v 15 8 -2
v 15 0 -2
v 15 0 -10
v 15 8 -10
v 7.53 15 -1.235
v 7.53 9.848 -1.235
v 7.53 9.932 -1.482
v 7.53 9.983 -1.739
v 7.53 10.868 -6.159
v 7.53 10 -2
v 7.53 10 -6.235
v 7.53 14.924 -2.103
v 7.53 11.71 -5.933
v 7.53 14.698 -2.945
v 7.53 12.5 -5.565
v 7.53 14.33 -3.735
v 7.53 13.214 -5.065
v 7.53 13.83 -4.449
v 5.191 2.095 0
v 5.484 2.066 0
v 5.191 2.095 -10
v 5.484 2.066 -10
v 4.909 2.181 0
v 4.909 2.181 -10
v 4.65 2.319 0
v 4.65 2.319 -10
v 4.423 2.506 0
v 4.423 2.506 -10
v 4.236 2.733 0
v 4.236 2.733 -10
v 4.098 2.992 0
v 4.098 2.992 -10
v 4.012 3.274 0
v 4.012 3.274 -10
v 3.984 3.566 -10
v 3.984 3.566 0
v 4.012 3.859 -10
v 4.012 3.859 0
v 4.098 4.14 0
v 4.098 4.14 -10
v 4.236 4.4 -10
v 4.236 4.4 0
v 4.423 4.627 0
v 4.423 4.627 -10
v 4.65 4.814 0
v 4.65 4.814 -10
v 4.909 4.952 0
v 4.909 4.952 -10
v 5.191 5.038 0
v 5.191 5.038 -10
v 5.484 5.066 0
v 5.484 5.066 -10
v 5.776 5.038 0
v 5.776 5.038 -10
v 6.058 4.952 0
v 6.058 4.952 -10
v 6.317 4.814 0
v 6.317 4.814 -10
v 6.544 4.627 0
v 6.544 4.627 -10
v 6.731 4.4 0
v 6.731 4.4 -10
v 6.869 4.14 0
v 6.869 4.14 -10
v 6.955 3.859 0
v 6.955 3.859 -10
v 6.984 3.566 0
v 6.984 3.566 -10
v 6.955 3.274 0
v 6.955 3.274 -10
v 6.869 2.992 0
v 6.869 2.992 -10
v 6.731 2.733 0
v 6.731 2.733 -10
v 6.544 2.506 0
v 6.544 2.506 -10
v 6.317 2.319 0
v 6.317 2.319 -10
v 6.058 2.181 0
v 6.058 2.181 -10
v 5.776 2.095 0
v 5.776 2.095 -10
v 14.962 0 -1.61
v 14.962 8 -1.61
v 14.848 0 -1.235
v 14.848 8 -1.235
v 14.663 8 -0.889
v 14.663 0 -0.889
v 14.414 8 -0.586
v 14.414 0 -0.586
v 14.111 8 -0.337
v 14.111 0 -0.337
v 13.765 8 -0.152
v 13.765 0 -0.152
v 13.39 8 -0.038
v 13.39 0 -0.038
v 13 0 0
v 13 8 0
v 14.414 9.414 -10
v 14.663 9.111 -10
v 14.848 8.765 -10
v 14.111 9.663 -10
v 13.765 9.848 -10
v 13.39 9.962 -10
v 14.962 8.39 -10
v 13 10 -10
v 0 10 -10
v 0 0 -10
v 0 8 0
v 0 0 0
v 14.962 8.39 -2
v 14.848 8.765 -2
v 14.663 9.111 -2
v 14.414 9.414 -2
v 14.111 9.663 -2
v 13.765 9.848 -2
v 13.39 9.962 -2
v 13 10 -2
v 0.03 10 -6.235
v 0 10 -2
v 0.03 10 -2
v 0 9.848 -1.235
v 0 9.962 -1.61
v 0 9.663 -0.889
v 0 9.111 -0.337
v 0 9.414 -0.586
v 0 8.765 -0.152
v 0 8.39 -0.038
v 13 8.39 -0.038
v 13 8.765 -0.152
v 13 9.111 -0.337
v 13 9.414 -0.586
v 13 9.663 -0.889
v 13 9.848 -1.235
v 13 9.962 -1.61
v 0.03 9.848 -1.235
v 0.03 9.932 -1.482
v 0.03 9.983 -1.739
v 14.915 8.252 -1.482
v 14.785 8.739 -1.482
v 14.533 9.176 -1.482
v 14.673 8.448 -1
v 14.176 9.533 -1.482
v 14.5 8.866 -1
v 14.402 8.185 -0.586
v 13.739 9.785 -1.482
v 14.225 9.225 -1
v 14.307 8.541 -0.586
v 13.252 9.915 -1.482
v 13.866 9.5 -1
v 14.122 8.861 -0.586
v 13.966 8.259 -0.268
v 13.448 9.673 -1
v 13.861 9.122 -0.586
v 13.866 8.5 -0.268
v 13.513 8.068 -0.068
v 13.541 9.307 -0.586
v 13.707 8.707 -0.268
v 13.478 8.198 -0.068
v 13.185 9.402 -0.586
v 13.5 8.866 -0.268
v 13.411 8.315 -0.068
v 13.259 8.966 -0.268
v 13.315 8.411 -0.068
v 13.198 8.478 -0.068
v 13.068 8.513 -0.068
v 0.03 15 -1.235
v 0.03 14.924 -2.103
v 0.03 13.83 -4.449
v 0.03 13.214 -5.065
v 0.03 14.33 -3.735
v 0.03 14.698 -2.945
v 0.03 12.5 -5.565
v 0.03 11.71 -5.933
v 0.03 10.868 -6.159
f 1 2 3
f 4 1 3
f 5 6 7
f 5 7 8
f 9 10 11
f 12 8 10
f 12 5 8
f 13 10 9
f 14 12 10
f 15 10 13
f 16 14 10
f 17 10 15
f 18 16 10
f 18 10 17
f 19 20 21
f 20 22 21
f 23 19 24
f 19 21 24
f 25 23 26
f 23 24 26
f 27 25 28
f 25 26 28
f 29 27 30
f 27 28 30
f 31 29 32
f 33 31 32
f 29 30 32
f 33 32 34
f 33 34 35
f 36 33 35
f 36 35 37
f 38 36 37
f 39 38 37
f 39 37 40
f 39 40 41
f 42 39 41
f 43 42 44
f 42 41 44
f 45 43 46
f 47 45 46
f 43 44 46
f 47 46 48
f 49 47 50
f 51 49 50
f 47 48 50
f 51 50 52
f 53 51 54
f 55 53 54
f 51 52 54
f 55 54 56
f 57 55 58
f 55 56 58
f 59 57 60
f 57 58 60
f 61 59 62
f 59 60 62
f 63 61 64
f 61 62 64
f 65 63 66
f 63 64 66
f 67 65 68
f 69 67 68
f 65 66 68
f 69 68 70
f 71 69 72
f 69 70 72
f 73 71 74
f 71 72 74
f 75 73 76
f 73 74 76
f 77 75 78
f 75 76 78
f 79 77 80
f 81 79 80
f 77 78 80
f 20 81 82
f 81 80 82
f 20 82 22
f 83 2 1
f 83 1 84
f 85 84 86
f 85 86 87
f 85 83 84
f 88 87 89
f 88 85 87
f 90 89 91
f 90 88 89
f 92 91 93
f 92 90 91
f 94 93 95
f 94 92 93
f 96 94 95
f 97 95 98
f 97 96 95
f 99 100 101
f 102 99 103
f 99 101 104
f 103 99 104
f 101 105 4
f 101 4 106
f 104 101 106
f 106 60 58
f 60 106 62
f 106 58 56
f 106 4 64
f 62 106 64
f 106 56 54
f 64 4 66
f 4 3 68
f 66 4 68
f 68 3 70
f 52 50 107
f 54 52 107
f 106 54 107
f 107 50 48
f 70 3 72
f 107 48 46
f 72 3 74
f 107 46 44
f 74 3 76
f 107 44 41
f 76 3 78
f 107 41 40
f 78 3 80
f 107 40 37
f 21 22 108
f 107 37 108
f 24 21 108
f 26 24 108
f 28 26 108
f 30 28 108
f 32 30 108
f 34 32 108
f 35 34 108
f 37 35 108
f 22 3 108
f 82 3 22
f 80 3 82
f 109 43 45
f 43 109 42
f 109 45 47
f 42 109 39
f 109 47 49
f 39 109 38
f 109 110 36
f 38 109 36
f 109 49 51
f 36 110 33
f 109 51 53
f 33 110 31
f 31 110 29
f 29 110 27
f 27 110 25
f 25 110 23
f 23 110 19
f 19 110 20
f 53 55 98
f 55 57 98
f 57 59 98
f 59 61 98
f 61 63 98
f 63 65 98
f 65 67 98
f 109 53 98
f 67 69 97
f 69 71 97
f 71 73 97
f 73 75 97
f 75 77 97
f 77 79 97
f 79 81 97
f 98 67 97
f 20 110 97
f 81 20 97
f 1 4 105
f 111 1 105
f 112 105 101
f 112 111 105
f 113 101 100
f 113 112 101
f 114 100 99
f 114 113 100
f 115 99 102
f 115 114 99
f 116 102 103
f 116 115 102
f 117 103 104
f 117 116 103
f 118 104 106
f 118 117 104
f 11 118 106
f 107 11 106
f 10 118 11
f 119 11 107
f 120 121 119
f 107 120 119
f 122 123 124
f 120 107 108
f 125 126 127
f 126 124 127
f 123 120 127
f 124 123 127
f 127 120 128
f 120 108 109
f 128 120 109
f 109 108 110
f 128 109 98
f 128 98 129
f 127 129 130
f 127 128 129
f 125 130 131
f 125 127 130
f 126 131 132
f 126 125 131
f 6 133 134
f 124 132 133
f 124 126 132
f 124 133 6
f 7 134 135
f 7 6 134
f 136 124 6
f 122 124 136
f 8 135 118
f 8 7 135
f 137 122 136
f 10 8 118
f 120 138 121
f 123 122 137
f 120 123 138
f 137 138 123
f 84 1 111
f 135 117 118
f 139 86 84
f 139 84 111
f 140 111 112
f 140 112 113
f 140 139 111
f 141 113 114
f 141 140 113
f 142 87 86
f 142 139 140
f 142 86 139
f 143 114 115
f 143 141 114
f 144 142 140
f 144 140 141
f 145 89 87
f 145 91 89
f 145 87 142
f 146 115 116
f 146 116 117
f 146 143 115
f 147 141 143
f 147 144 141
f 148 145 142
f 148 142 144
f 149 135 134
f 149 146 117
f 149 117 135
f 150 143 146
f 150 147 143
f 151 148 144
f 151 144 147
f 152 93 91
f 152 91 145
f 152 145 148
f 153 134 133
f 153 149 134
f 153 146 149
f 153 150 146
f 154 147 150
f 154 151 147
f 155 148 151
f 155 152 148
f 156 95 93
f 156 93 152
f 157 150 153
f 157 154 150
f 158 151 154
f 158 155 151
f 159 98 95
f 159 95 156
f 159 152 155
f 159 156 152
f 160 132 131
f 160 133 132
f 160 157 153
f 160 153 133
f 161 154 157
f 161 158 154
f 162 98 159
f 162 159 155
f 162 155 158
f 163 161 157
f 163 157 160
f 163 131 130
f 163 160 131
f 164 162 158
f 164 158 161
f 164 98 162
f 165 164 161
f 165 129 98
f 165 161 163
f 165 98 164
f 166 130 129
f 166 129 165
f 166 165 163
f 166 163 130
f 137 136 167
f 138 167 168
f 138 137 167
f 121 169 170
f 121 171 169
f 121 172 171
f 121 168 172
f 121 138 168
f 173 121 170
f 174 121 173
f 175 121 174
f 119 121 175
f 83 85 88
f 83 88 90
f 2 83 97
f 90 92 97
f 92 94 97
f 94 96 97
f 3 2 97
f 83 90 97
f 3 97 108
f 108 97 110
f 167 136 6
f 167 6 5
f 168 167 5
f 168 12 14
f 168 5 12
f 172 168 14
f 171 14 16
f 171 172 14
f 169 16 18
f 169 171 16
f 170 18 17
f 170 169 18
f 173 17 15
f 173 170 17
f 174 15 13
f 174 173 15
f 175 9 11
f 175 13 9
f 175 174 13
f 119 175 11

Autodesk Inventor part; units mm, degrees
ref_plane "YZ Plane" through (0, 0, 0) normal (1, 0, 0) x (0, 1, 0)
ref_plane "XZ Plane" through (0, 0, 0) normal (0, 1, 0) x (-1, 0, 0)
ref_plane "XY Plane" through (0, 0, 0) normal (0, 0, 1) x (1, 0, 0)
sketch "Sketch1" plane through (0, 0, 0) normal (0, 1, 0) x (-1, 0, 0)
  line L0 (0, 0) -> (-15, 0)
  line L1 (-15, 0) -> (-15, -10)
  line L2 (-15, -10) -> (0, -10)
  line L3 (0, -10) -> (0, 0)
  dimension "d0" = 10
  dimension "d1" = 15
extrude "Extrusion1" add sketch "Sketch1" along normal blind 10
sketch "Sketch2" plane through (0, 10, 0) normal (0, 1, 0) x (1, 0, 0)
  line L0 (0.0305, 1.2348) -> (7.5305, 1.2348)
  line L1 (7.5305, 1.2348) -> (7.5305, 6.2348)
  line L2 (7.5305, 6.2348) -> (0.0305, 6.2348)
  line L3 (0.0305, 6.2348) -> (0.0305, 1.2348)
  point P0 (0, 0)
  dimension "d4" = 5
  dimension "d5" = 7.5
revolve "Revolution1" add sketch "Sketch2" angle 90 about axis through (0.0305, 10, -1.2348) along (1, 0, 0)
fillet "Fillet1" radius 2 3 edges at (7.5, 10, 0) (15, 10, -5) (15, 5, 0)
sketch "Sketch3" plane through (0, 0, 0) normal (0, 0, 1) x (1, 0, 0)
  point P0 (0, 0)
  point P1 (5.4835, 3.5664)
hole "Hole1" at (5.4835, 3.5664, 0) direction (0, 0, -1) diameter 3 end through all
properties part number "TEAM4788-001-Test-Part"
